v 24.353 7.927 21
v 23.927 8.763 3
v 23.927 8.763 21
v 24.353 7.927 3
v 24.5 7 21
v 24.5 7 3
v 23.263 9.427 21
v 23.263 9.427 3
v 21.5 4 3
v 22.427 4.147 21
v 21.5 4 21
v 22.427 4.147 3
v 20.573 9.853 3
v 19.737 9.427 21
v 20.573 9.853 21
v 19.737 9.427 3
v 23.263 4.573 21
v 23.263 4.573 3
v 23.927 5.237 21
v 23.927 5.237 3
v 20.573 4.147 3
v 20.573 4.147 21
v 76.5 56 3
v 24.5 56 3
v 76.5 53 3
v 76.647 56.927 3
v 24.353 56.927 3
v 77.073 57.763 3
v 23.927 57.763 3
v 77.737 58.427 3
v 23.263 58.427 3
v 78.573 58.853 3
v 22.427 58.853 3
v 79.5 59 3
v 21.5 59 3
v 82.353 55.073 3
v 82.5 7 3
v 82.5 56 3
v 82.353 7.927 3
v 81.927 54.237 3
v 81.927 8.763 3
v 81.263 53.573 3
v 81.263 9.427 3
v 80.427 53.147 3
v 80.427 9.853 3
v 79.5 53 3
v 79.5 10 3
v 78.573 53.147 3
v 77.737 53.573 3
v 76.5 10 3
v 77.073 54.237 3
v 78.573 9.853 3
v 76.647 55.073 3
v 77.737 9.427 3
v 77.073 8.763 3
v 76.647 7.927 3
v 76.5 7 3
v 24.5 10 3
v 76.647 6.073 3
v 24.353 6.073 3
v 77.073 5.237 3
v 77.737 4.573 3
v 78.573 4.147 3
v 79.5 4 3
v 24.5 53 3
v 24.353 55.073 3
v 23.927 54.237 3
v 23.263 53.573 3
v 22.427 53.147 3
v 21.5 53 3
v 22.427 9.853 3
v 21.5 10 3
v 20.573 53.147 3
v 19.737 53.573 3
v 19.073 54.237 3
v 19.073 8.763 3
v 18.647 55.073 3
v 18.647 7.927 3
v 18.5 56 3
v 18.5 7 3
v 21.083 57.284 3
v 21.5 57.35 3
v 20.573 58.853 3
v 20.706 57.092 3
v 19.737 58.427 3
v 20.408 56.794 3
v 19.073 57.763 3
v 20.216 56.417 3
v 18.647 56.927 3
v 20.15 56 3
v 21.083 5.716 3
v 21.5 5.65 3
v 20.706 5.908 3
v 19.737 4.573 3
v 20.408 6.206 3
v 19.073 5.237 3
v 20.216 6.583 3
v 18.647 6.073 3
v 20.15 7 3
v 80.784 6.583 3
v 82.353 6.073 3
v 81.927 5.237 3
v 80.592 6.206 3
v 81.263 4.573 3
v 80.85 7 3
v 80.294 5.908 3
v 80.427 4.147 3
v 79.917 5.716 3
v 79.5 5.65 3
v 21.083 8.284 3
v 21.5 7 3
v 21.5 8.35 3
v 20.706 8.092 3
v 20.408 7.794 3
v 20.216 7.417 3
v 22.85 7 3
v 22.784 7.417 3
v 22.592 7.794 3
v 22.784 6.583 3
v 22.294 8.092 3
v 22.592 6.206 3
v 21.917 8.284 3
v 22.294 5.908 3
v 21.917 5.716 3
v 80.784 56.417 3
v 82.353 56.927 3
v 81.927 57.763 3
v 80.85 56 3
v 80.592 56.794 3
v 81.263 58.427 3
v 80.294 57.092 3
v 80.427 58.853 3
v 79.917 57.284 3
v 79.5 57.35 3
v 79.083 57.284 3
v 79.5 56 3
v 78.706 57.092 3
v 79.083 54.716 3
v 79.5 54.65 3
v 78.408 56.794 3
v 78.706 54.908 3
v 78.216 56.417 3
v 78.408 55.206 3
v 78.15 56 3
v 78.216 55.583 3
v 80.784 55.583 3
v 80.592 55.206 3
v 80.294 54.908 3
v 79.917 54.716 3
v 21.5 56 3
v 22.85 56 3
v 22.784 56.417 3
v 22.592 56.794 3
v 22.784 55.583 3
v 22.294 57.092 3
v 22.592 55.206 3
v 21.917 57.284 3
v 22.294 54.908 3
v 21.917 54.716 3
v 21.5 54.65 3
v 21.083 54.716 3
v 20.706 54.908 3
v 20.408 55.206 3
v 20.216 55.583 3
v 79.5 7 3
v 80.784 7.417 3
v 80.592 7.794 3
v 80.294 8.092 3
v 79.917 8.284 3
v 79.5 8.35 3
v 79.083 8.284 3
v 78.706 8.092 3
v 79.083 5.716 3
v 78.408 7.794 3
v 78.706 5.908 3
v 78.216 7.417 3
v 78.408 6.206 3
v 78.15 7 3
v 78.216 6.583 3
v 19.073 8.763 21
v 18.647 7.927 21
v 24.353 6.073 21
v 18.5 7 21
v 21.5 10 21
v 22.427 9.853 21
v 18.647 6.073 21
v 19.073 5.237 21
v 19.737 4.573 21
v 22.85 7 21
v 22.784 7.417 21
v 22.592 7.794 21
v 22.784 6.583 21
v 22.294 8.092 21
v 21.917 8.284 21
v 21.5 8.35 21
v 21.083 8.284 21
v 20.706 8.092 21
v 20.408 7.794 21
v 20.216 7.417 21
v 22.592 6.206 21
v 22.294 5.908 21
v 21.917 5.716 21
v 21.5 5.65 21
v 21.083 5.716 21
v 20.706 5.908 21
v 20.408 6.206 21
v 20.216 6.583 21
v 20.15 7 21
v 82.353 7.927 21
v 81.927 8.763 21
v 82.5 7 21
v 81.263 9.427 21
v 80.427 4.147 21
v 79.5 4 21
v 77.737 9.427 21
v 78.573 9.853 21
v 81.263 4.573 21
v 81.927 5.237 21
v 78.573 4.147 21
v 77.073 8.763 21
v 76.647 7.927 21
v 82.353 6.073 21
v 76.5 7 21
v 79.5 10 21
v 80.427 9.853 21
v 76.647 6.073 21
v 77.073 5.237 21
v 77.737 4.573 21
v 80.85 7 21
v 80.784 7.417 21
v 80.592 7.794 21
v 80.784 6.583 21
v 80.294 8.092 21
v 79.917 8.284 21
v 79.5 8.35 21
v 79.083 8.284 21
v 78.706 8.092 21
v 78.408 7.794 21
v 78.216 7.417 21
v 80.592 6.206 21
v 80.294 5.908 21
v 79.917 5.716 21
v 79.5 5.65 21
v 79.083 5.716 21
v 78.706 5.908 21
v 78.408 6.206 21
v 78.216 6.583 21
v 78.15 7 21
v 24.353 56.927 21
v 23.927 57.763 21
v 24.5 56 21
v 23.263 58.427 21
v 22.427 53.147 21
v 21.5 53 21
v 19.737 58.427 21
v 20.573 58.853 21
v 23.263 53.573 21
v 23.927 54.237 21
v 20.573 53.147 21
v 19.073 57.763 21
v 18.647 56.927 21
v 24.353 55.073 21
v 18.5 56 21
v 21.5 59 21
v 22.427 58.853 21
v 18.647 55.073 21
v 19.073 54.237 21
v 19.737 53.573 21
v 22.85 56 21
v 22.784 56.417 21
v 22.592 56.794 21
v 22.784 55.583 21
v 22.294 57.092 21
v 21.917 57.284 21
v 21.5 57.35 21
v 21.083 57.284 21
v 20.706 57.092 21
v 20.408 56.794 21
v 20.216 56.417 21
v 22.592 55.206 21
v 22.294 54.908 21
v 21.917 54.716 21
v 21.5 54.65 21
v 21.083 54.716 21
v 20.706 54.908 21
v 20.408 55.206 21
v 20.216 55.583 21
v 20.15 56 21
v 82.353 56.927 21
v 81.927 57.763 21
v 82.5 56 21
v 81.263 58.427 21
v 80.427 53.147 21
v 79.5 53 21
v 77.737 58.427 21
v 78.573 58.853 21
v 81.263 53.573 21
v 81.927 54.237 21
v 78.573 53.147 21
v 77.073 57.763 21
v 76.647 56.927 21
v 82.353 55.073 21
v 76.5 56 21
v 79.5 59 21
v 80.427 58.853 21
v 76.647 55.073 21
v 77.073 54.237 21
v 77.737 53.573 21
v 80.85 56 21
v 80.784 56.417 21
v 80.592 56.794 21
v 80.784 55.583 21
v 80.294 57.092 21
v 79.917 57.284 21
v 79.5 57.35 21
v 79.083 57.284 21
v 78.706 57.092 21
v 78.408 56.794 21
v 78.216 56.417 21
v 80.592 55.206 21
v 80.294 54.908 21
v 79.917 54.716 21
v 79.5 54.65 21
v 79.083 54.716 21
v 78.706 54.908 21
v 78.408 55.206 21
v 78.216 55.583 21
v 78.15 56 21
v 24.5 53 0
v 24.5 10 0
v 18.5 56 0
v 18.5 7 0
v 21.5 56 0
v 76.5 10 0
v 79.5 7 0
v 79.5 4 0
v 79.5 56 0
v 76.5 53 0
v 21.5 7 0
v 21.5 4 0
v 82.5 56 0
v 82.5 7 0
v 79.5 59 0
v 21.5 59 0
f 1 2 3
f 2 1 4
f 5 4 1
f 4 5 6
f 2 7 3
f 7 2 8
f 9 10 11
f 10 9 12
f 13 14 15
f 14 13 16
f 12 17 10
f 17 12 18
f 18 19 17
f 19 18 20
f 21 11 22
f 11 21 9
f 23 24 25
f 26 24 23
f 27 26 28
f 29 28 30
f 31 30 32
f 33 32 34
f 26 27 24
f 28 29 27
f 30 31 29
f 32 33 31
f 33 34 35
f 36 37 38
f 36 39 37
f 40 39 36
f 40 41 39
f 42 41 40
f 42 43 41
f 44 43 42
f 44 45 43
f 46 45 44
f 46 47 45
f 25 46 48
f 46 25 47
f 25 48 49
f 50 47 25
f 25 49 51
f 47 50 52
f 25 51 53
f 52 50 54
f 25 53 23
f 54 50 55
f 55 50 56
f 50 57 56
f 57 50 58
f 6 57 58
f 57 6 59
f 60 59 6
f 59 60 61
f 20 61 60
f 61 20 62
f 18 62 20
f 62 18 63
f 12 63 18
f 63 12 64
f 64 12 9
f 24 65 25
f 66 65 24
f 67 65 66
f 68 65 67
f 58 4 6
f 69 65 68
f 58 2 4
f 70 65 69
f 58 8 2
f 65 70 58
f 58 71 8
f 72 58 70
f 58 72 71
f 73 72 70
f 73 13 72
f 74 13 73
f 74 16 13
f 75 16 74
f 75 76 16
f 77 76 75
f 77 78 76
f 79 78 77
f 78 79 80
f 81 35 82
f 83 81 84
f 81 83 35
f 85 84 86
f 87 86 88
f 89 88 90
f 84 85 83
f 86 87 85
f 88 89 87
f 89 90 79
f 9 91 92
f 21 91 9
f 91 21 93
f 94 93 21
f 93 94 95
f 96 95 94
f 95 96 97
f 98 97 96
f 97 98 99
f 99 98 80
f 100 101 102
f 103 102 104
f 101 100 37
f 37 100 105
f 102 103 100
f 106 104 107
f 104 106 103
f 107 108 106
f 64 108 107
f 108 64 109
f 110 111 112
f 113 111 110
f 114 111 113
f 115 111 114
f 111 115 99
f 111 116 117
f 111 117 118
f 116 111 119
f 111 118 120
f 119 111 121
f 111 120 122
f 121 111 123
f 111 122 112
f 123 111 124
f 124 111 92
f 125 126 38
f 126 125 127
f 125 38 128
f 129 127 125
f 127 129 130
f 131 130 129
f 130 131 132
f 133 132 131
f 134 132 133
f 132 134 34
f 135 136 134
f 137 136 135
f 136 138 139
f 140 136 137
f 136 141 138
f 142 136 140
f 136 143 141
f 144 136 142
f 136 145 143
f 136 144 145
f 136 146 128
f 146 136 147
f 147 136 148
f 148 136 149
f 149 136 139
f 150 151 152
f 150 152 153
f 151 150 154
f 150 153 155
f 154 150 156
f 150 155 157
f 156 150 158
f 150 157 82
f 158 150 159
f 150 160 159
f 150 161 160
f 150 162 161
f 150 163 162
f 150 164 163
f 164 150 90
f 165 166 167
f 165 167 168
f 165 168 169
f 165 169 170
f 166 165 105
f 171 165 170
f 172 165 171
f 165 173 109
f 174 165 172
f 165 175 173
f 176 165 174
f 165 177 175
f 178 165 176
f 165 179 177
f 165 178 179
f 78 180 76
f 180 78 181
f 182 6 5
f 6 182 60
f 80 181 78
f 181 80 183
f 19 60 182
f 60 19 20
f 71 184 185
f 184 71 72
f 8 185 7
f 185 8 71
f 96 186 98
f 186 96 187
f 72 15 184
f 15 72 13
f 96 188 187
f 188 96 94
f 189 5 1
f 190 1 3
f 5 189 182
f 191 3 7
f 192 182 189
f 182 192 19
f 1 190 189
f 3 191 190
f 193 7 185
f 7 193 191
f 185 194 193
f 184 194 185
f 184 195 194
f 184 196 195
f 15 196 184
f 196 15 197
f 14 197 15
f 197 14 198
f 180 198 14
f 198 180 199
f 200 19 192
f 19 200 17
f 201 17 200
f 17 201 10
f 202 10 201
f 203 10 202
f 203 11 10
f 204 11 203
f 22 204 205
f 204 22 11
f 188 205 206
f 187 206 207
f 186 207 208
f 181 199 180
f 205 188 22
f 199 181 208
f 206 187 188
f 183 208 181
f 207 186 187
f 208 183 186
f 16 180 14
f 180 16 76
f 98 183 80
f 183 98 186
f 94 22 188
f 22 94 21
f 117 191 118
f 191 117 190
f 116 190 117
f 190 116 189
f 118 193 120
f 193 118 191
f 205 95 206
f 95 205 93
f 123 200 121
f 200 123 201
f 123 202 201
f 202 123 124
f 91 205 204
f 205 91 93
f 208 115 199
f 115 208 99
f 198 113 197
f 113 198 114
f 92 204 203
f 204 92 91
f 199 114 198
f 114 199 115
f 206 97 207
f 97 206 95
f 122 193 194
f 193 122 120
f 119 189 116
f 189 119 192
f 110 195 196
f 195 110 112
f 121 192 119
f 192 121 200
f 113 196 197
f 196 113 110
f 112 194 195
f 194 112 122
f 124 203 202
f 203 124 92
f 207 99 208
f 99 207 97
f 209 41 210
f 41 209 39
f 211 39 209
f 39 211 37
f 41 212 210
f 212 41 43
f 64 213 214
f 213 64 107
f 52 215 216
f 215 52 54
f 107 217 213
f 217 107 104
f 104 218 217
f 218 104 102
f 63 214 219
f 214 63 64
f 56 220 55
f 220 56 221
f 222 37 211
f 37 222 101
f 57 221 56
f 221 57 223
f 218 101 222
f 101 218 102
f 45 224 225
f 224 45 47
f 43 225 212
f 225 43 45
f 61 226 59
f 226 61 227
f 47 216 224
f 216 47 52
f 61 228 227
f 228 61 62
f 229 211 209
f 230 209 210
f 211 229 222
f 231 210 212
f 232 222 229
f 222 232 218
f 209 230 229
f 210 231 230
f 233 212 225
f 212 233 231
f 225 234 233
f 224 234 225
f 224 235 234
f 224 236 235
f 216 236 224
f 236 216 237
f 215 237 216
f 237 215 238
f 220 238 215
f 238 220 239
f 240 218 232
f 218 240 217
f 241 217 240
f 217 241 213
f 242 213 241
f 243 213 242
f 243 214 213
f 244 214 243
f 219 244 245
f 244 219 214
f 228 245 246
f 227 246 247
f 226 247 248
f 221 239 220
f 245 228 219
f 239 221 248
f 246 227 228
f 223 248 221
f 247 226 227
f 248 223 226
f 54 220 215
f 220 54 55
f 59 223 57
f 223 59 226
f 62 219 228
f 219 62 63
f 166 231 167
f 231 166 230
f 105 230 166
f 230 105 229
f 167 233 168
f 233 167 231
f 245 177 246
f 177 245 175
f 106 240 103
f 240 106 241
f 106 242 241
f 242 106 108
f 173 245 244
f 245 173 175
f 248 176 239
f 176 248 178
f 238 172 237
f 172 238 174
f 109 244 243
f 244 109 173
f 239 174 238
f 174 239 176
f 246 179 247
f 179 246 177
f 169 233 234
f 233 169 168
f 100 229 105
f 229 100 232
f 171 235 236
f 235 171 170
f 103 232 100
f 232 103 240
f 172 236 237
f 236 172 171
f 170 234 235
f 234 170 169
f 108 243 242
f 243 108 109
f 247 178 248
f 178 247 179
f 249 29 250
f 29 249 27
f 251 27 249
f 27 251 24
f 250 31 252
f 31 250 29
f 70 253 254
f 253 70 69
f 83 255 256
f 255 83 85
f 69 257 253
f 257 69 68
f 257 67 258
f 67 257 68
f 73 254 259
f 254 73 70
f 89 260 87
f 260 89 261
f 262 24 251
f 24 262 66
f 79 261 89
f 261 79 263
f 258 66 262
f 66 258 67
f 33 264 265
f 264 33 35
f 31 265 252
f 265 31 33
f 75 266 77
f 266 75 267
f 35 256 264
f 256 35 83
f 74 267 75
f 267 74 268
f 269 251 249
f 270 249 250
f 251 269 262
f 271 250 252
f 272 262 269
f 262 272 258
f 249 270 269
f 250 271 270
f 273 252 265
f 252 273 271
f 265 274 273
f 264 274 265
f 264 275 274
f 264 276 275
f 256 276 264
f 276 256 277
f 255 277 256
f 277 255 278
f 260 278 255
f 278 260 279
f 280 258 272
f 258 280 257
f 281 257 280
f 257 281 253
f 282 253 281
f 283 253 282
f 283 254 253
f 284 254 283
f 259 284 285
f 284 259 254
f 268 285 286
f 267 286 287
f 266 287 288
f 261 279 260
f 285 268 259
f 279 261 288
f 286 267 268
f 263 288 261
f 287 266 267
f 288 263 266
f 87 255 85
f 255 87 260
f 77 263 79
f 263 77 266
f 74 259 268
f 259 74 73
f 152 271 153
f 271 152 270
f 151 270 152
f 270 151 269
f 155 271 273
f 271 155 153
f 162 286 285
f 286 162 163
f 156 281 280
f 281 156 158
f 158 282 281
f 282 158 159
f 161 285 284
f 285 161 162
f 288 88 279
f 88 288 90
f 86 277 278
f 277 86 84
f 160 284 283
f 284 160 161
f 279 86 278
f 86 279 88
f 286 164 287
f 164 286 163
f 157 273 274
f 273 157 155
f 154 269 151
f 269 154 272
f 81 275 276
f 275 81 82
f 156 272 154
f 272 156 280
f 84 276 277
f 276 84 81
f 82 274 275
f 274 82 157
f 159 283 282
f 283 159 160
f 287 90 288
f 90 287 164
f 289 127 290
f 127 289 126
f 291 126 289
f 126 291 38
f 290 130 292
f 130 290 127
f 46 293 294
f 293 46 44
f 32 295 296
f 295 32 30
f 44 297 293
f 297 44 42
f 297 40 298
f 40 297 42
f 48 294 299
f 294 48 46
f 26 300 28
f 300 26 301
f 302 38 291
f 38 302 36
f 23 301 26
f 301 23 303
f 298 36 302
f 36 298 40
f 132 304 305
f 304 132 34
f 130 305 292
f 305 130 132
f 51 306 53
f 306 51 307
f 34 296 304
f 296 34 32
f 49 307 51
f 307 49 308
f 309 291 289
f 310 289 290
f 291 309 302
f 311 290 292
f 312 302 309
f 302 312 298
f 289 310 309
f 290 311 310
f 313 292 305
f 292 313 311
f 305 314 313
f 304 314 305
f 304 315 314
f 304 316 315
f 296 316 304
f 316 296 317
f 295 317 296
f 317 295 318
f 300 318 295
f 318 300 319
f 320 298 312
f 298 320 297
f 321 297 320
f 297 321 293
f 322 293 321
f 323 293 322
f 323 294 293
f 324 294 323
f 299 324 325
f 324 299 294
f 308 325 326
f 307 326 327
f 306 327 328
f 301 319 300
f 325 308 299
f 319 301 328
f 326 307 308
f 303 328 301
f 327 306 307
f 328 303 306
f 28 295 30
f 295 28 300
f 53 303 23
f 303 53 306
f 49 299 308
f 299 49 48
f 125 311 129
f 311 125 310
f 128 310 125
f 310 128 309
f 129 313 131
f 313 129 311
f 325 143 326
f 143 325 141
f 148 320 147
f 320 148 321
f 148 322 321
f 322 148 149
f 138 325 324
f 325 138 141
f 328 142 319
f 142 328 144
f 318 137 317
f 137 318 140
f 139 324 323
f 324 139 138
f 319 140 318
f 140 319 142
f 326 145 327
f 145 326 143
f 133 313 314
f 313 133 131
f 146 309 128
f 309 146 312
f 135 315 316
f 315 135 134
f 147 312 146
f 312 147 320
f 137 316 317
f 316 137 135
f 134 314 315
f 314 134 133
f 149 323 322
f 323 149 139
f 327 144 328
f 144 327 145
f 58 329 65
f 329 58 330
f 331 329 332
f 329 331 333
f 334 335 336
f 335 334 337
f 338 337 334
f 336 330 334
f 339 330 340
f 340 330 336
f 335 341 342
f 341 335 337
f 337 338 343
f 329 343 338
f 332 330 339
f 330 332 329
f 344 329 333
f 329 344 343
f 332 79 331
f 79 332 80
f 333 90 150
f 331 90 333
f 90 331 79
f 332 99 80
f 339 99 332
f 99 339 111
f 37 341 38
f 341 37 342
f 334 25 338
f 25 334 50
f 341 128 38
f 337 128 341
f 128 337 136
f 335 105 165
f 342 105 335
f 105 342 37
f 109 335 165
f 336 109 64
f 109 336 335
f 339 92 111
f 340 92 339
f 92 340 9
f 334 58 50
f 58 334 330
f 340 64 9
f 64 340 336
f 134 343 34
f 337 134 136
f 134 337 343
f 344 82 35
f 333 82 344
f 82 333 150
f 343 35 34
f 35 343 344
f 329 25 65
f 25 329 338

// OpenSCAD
// Neato XV Signature Pro - Right Pod STANDOFF ALIGNMENT TEST
// Minimal print — just standoffs connected by thin rails.
// Verifies Pi 5 hole pattern alignment only.
// Print in ~20-30 min at 0.2mm, 60mm/s.
// No supports needed.

// ============================================================
// PARAMETERS (must match right_pod.scad)
// ============================================================

pod_width  = 101;
pod_depth  = 70;

rail_w = 5;
base_h = 3;  // thin base — just enough to hold standoffs together

standoff_h    = 18;
standoff_od   = 6;
standoff_hole = 2.7; // M2.5

pi_hole_x_span = 58;
pi_hole_y_span = 49;

pi_x_left  = (pod_width - pi_hole_x_span) / 2;  // 21.5mm
pi_x_right = pi_x_left + pi_hole_x_span;         // 79.5mm

pi_y_front = rail_w + 2;                          // 7mm from non-USB side
pi_y_rear  = pi_y_front + pi_hole_y_span;         // 56mm

pi_holes = [
    [pi_x_left,  pi_y_front],
    [pi_x_right, pi_y_front],
    [pi_x_left,  pi_y_rear ],
    [pi_x_right, pi_y_rear ],
];

// ============================================================
// MODULES
// ============================================================

module standoff(h, hole_d) {
    difference() {
        cylinder(h=h, d=standoff_od, $fn=20);
        cylinder(h=h + 0.1, d=hole_d, $fn=20);
    }
}

// ============================================================
// MAIN — thin cross rails + standoffs only
// ============================================================

union() {
    // Thin rail connecting left standoffs (front to rear)
    translate([pi_x_left - standoff_od/2, pi_y_front, 0])
        cube([standoff_od, pi_hole_y_span, base_h]);

    // Thin rail connecting right standoffs (front to rear)
    translate([pi_x_right - standoff_od/2, pi_y_front, 0])
        cube([standoff_od, pi_hole_y_span, base_h]);

    // Thin rail connecting front standoffs (left to right)
    translate([pi_x_left, pi_y_front - standoff_od/2, 0])
        cube([pi_hole_x_span, standoff_od, base_h]);

    // Thin rail connecting rear standoffs (left to right)
    translate([pi_x_left, pi_y_rear - standoff_od/2, 0])
        cube([pi_hole_x_span, standoff_od, base_h]);

    // Four standoffs
    for (h = pi_holes) {
        translate([h[0], h[1], base_h])
            standoff(standoff_h, standoff_hole);
    }
}
